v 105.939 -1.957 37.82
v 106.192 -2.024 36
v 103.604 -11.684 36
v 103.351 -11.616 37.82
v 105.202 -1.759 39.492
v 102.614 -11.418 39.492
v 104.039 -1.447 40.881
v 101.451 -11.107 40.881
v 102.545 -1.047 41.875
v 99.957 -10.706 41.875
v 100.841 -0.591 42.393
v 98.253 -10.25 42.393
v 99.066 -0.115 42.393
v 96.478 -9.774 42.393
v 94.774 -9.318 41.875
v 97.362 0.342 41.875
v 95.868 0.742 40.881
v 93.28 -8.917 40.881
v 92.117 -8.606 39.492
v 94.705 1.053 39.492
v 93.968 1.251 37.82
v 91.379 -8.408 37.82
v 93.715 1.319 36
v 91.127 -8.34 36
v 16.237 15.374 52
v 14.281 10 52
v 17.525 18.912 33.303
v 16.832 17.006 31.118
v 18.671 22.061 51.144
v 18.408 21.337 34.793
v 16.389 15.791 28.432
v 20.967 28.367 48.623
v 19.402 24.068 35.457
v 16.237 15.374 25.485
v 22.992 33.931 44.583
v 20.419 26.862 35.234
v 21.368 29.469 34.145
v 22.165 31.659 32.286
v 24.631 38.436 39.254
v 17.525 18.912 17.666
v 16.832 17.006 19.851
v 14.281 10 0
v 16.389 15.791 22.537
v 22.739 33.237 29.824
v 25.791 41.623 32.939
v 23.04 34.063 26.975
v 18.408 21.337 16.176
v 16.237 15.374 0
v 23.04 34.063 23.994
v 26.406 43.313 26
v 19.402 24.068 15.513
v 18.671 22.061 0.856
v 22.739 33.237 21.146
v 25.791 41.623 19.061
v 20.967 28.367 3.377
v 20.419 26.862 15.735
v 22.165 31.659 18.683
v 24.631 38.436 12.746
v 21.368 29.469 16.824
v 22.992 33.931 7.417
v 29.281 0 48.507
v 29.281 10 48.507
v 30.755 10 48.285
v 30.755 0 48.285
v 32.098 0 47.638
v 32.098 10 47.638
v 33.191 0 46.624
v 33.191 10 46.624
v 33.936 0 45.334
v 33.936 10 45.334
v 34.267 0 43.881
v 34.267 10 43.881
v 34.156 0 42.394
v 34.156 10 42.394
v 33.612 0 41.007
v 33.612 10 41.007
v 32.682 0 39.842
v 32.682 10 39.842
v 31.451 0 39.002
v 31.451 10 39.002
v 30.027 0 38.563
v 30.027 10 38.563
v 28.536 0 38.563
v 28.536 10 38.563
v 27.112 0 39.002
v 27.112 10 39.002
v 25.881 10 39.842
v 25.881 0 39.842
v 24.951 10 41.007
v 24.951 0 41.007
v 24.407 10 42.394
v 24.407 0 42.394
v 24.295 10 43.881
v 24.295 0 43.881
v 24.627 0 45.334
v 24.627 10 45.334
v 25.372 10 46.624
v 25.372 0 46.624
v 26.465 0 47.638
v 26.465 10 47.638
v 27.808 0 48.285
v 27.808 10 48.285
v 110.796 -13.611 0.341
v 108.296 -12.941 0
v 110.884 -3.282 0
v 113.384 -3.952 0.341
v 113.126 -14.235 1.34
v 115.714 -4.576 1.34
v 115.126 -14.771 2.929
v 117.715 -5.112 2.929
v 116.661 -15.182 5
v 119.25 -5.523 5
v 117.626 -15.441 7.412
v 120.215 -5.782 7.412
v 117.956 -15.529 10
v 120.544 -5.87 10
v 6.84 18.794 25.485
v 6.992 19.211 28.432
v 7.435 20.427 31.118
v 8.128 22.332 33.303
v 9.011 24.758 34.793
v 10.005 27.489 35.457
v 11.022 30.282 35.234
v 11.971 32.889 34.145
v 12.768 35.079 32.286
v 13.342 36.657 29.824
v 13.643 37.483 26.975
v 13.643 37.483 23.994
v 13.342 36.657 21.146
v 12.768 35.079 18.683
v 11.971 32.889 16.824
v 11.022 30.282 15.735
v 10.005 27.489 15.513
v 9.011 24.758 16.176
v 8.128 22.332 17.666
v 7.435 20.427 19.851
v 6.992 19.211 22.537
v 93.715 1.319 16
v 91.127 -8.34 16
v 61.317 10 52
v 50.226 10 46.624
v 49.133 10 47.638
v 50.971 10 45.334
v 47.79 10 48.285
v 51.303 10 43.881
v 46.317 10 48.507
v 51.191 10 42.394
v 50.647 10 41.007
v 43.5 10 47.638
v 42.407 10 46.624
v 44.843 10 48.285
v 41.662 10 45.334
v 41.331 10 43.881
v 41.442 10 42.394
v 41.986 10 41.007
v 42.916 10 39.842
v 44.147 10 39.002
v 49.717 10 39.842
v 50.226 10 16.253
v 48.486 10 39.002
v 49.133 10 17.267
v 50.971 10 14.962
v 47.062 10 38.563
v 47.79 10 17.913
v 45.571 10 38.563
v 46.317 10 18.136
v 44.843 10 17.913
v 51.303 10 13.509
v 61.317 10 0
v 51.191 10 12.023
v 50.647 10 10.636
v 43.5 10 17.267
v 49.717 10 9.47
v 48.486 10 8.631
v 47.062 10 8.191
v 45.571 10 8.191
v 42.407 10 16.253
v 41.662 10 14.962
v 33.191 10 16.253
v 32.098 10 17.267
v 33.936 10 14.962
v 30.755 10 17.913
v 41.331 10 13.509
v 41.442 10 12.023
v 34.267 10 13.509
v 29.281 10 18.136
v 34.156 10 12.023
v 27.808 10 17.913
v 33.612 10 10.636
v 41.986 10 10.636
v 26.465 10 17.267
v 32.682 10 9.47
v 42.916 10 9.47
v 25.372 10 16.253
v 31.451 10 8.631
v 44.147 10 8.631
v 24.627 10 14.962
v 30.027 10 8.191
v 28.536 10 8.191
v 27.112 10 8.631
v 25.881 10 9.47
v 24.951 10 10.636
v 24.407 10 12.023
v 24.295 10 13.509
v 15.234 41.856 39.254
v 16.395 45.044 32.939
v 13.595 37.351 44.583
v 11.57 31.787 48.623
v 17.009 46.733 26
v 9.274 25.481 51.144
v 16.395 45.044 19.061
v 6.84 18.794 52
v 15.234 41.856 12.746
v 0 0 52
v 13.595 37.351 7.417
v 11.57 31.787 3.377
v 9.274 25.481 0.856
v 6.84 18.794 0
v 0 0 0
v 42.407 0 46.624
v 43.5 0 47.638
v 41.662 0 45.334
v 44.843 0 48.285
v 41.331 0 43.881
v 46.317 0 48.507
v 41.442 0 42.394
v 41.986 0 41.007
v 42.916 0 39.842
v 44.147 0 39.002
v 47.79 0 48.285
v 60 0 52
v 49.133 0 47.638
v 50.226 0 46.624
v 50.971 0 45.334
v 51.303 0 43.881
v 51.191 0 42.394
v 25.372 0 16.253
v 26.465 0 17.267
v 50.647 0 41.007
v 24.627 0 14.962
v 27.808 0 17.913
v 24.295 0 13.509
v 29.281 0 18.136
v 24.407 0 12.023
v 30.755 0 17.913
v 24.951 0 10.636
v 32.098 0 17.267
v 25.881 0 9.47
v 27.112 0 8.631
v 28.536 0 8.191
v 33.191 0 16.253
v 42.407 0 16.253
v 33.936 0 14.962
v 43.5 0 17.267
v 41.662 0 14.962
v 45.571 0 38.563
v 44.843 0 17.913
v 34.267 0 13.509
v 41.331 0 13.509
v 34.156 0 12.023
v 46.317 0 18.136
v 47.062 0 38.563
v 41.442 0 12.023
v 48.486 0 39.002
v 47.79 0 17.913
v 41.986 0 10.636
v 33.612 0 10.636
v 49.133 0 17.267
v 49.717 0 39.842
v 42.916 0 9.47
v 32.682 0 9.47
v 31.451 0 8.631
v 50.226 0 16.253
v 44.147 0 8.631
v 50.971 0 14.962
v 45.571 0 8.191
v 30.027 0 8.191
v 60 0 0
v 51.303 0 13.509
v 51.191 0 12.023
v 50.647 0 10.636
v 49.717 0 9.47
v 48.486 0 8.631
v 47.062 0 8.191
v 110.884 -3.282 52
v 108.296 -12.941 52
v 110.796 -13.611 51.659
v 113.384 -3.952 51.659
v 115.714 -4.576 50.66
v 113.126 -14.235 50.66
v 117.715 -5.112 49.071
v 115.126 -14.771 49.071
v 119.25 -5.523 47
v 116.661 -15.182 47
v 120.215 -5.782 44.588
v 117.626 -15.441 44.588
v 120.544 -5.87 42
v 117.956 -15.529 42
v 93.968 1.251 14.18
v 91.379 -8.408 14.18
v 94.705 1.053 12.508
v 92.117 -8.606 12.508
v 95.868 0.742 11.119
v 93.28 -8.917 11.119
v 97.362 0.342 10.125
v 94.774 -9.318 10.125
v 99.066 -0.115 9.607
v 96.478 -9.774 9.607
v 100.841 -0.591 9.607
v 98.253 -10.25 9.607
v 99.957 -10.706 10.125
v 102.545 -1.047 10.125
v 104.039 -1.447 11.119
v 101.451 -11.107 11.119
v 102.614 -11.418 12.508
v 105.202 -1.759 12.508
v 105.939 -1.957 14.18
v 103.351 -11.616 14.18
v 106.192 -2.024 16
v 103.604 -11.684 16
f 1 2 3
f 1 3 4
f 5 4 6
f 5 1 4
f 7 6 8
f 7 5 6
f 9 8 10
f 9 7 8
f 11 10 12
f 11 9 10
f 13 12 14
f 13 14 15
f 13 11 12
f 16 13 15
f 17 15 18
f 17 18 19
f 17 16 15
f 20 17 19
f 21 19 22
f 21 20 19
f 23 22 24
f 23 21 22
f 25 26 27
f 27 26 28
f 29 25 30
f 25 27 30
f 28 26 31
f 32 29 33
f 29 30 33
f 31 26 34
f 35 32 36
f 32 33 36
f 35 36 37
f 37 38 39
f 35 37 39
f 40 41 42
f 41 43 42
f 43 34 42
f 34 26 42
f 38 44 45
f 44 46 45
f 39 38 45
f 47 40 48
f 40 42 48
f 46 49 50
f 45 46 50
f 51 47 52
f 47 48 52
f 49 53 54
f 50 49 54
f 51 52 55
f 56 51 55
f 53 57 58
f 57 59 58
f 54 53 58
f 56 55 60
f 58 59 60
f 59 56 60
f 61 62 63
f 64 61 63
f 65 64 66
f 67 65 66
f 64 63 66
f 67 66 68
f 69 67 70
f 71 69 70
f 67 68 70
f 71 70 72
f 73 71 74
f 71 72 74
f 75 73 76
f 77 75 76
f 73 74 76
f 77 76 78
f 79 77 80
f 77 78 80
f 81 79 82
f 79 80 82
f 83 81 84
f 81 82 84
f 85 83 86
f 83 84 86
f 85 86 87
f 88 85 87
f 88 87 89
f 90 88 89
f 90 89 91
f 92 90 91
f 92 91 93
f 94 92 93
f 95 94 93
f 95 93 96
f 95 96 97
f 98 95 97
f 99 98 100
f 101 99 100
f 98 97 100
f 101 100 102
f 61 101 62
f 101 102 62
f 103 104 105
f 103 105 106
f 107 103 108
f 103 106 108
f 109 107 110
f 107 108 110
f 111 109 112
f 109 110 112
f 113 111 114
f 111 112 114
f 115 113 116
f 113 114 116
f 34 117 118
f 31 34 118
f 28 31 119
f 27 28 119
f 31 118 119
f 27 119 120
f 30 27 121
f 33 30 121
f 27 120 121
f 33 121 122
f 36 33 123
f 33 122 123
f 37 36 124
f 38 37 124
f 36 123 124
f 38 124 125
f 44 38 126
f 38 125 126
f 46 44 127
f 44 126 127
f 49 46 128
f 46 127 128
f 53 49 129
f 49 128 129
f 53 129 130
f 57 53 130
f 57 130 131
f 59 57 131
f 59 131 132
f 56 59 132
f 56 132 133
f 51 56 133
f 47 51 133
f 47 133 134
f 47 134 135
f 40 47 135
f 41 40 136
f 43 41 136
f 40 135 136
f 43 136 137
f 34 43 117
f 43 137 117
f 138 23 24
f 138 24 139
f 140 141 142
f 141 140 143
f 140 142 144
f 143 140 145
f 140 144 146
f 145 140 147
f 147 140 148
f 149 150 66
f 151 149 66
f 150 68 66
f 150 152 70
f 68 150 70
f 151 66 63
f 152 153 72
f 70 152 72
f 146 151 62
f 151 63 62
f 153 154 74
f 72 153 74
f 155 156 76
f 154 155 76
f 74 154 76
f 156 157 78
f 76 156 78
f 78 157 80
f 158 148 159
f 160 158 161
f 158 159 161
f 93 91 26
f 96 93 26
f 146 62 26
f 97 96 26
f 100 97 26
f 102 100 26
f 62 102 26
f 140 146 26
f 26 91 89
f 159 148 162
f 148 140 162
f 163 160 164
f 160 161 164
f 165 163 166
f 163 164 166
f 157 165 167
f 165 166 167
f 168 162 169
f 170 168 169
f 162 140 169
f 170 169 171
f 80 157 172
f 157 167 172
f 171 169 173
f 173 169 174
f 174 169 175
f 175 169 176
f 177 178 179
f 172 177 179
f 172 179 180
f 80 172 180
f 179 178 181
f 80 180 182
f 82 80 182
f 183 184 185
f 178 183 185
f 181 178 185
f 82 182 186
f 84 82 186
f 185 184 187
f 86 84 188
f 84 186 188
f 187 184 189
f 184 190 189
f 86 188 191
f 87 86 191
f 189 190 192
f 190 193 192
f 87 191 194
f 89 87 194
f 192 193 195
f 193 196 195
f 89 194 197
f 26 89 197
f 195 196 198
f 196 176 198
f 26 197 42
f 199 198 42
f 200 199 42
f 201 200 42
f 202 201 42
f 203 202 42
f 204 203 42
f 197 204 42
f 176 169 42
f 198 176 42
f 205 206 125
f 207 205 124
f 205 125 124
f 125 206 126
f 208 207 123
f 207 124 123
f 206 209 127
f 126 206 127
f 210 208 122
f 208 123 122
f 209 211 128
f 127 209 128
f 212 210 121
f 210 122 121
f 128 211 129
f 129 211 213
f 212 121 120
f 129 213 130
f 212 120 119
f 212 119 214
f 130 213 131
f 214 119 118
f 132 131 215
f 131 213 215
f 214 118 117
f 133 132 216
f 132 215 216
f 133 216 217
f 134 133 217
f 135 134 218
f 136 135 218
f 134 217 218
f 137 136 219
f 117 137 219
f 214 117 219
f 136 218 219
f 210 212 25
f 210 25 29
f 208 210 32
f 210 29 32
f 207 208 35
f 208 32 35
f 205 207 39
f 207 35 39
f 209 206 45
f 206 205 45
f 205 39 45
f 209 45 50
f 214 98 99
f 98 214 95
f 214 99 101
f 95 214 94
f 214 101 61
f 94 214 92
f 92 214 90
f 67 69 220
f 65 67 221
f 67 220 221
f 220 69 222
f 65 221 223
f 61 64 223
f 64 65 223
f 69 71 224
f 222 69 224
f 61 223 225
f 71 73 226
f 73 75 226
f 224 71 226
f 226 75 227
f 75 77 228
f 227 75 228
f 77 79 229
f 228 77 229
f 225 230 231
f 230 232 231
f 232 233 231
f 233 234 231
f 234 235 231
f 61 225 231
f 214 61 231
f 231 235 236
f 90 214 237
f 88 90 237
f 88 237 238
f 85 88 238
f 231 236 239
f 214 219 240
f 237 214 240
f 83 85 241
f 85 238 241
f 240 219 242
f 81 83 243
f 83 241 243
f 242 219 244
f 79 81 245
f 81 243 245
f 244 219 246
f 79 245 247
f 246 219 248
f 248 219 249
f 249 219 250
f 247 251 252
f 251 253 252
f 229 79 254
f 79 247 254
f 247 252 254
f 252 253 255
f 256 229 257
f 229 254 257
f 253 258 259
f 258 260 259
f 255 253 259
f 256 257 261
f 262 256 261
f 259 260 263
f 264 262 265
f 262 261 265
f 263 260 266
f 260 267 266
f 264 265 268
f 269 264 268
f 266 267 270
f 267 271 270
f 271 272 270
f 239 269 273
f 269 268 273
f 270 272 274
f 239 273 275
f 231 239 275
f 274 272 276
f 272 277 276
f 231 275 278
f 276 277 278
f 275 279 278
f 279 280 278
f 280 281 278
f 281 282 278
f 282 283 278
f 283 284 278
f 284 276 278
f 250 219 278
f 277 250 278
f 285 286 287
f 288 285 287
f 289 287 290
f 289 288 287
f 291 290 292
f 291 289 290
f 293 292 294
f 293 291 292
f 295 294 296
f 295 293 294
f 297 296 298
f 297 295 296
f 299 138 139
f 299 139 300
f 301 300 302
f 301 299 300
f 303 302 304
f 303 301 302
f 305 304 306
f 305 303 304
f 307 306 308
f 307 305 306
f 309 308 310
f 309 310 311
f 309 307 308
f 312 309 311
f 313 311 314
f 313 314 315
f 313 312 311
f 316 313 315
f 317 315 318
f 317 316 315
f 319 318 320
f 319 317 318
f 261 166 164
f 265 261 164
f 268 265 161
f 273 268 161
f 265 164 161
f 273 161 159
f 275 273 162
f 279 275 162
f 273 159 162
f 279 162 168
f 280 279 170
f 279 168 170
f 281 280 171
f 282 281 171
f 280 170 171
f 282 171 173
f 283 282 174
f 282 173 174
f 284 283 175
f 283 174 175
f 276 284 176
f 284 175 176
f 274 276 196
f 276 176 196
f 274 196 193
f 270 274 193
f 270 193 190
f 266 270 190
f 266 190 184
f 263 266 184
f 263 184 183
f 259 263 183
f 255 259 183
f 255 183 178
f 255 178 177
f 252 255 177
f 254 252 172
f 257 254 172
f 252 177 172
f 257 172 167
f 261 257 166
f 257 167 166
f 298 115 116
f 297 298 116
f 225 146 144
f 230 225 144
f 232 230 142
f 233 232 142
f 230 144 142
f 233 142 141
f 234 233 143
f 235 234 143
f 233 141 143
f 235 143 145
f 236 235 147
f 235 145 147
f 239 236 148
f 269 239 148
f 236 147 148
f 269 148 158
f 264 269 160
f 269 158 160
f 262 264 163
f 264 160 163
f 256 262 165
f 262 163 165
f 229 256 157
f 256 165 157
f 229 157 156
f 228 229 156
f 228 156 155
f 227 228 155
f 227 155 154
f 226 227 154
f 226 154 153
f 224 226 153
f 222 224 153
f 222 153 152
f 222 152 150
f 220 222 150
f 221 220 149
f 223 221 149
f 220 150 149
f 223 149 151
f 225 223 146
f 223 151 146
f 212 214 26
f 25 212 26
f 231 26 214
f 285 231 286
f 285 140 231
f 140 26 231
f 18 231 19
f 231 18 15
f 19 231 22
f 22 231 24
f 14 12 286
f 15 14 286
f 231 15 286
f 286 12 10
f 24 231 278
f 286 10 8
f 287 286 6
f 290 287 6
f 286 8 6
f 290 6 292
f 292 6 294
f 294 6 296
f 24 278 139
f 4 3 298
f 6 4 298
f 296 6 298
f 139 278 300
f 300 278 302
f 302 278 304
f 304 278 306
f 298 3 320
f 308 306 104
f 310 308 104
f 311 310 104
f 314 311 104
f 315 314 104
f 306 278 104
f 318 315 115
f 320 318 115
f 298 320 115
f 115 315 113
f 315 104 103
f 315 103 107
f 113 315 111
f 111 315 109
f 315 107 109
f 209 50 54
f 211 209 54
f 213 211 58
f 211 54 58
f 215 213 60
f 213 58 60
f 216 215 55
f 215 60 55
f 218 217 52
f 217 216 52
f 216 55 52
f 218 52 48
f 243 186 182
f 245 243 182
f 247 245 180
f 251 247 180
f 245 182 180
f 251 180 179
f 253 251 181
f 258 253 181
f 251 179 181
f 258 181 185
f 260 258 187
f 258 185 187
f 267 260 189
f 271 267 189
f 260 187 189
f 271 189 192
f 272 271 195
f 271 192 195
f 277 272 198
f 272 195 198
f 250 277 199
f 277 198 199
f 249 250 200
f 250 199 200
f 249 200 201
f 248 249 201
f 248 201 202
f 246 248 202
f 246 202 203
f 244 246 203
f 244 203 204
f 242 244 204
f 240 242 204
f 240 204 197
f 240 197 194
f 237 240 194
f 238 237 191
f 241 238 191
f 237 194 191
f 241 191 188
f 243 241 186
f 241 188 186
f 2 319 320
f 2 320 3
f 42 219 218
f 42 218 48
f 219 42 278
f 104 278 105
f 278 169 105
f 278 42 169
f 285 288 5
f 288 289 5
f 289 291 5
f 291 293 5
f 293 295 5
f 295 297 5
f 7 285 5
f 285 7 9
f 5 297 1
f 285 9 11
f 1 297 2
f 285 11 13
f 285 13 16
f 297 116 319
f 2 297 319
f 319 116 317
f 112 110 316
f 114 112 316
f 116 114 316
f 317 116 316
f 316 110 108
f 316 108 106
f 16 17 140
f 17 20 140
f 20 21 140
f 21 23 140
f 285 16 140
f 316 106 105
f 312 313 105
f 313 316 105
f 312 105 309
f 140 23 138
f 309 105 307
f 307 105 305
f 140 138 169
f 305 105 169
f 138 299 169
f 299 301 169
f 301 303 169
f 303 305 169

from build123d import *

# Parameters (mm, degrees)
EXTRUDE_THIN1_DEPTH = 52
SKETCH2_R           = 10
CUT_EXTRUDE2_DEPTH  = 10
FILLET1_R           = 30
CUT_EXTRUDE3_DEPTH  = 10
FILLET2_R           = 10
SKETCH4_R           = 5
CUT_EXTRUDE4_DEPTH  = 10


with BuildPart() as part:
    # Sketch1 → Extrude-Thin1 (new body)
    with BuildSketch(Plane.XY):
        Polygon((17.101007166, 46.984631039), (0, 0), (60, 0), (117.955549577, -15.529142706), (120.543740028, -5.869884443), (61.316524976, 10), (14.281480067, 10), (26.497933374, 43.564429606), align=None)
    extrude(amount=EXTRUDE_THIN1_DEPTH)

    # Sketch2 → Cut-Extrude2 (cut)
    with BuildSketch(Plane(origin=(0, 0, 0), x_dir=(0, 0, 1), z_dir=(-0.9396926207859096, 0.34202014332566566, 0))):
        with Locations(Location((25.484668599, 30, 0), (0, 0, 270))):
            Circle(SKETCH2_R)
    extrude(amount=-CUT_EXTRUDE2_DEPTH, mode=Mode.SUBTRACT)

    # Fillet1
    # the kernel refuses this fillet: 30 mm, written as the material it takes off along each edge
    with BuildSketch(Plane(origin=(96.974879933, 17.912918857, 0), x_dir=(0, 0, 1), z_dir=(-0.9396926207859095, 0.34202014332566577, 0))) as fillet1_piece_1_section:
        with BuildLine():
            CenterArc((FILLET1_R, -FILLET1_R), FILLET1_R, 90, 90)
            Line((0, -FILLET1_R), (0, 0))
            Line((0, 0), (FILLET1_R, 0))
        make_face()
    fillet1_piece_1 = extrude(amount=160, mode=Mode.PRIVATE)
    fillet1_piece_1 = split(fillet1_piece_1, bisect_by=Plane(origin=(19.547189191, 10, 6.743574493), z_dir=(0, 1, 0)), keep=Keep.TOP, mode=Mode.PRIVATE)
    add(fillet1_piece_1, mode=Mode.SUBTRACT)
    with BuildSketch(Plane(origin=(96.974879933, 17.912918857, 52), x_dir=(0, 0, -1), z_dir=(-0.9396926207859095, 0.34202014332566577, 0))) as fillet1_piece_2_section:
        with BuildLine():
            CenterArc((FILLET1_R, FILLET1_R), FILLET1_R, 180, 90)
            Line((0, FILLET1_R), (0, 0))
            Line((0, 0), (FILLET1_R, 0))
        make_face()
    fillet1_piece_2 = extrude(amount=160, mode=Mode.PRIVATE)
    fillet1_piece_2 = split(fillet1_piece_2, bisect_by=Plane(origin=(19.547189191, 10, 45.256425507), z_dir=(0, 1, 0)), keep=Keep.TOP, mode=Mode.PRIVATE)
    add(fillet1_piece_2, mode=Mode.SUBTRACT)

    # Sketch3 → Cut-Extrude3 (cut)
    with BuildSketch(Plane(origin=(6.607428337, 24.659258263, 0), x_dir=(0.9659258262890682, -0.25881904510252124, 0), z_dir=(0.25881904510252124, 0.9659258262890682, 0))):
        with BuildLine():
            Line((90.180356015, -36), (90.180356015, -16))
            ThreePointArc((90.180356015, -16), (96.639024601, -9.541331414), (103.097693188, -16))
            Line((103.097693188, -16), (103.097693188, -36))
            ThreePointArc((103.097693188, -36), (96.639024601, -42.458668586), (90.180356015, -36))
        make_face()
    extrude(amount=-CUT_EXTRUDE3_DEPTH, mode=Mode.SUBTRACT)

    # Fillet2
    fillet2_edges = [part.edges().sort_by_distance(p)[0] for p in [
        (119.249644803, -10.699513575, 52),
        (119.249644803, -10.699513575, 0),
    ]]
    fillet(fillet2_edges, radius=FILLET2_R)

    # Sketch4 → Cut-Extrude4 (cut)
    with BuildSketch(Plane(origin=(0, 10, 0), x_dir=(1, 0, 0), z_dir=(0, 1, 0))):
        with Locations(Location((29.281480067, -43.506992199, 0), (0, 0, 270))):
            Circle(SKETCH4_R)
        with Locations(Location((29.281480067, -13.135621251, 0), (0, 0, 270))):
            Circle(SKETCH4_R)
        with Locations(Location((46.316524976, -13.135621251, 0), (0, 0, 270))):
            Circle(SKETCH4_R)
        with Locations(Location((46.316524976, -43.506992199, 0), (0, 0, 270))):
            Circle(SKETCH4_R)
    extrude(amount=-CUT_EXTRUDE4_DEPTH, mode=Mode.SUBTRACT)


solid = part.part
